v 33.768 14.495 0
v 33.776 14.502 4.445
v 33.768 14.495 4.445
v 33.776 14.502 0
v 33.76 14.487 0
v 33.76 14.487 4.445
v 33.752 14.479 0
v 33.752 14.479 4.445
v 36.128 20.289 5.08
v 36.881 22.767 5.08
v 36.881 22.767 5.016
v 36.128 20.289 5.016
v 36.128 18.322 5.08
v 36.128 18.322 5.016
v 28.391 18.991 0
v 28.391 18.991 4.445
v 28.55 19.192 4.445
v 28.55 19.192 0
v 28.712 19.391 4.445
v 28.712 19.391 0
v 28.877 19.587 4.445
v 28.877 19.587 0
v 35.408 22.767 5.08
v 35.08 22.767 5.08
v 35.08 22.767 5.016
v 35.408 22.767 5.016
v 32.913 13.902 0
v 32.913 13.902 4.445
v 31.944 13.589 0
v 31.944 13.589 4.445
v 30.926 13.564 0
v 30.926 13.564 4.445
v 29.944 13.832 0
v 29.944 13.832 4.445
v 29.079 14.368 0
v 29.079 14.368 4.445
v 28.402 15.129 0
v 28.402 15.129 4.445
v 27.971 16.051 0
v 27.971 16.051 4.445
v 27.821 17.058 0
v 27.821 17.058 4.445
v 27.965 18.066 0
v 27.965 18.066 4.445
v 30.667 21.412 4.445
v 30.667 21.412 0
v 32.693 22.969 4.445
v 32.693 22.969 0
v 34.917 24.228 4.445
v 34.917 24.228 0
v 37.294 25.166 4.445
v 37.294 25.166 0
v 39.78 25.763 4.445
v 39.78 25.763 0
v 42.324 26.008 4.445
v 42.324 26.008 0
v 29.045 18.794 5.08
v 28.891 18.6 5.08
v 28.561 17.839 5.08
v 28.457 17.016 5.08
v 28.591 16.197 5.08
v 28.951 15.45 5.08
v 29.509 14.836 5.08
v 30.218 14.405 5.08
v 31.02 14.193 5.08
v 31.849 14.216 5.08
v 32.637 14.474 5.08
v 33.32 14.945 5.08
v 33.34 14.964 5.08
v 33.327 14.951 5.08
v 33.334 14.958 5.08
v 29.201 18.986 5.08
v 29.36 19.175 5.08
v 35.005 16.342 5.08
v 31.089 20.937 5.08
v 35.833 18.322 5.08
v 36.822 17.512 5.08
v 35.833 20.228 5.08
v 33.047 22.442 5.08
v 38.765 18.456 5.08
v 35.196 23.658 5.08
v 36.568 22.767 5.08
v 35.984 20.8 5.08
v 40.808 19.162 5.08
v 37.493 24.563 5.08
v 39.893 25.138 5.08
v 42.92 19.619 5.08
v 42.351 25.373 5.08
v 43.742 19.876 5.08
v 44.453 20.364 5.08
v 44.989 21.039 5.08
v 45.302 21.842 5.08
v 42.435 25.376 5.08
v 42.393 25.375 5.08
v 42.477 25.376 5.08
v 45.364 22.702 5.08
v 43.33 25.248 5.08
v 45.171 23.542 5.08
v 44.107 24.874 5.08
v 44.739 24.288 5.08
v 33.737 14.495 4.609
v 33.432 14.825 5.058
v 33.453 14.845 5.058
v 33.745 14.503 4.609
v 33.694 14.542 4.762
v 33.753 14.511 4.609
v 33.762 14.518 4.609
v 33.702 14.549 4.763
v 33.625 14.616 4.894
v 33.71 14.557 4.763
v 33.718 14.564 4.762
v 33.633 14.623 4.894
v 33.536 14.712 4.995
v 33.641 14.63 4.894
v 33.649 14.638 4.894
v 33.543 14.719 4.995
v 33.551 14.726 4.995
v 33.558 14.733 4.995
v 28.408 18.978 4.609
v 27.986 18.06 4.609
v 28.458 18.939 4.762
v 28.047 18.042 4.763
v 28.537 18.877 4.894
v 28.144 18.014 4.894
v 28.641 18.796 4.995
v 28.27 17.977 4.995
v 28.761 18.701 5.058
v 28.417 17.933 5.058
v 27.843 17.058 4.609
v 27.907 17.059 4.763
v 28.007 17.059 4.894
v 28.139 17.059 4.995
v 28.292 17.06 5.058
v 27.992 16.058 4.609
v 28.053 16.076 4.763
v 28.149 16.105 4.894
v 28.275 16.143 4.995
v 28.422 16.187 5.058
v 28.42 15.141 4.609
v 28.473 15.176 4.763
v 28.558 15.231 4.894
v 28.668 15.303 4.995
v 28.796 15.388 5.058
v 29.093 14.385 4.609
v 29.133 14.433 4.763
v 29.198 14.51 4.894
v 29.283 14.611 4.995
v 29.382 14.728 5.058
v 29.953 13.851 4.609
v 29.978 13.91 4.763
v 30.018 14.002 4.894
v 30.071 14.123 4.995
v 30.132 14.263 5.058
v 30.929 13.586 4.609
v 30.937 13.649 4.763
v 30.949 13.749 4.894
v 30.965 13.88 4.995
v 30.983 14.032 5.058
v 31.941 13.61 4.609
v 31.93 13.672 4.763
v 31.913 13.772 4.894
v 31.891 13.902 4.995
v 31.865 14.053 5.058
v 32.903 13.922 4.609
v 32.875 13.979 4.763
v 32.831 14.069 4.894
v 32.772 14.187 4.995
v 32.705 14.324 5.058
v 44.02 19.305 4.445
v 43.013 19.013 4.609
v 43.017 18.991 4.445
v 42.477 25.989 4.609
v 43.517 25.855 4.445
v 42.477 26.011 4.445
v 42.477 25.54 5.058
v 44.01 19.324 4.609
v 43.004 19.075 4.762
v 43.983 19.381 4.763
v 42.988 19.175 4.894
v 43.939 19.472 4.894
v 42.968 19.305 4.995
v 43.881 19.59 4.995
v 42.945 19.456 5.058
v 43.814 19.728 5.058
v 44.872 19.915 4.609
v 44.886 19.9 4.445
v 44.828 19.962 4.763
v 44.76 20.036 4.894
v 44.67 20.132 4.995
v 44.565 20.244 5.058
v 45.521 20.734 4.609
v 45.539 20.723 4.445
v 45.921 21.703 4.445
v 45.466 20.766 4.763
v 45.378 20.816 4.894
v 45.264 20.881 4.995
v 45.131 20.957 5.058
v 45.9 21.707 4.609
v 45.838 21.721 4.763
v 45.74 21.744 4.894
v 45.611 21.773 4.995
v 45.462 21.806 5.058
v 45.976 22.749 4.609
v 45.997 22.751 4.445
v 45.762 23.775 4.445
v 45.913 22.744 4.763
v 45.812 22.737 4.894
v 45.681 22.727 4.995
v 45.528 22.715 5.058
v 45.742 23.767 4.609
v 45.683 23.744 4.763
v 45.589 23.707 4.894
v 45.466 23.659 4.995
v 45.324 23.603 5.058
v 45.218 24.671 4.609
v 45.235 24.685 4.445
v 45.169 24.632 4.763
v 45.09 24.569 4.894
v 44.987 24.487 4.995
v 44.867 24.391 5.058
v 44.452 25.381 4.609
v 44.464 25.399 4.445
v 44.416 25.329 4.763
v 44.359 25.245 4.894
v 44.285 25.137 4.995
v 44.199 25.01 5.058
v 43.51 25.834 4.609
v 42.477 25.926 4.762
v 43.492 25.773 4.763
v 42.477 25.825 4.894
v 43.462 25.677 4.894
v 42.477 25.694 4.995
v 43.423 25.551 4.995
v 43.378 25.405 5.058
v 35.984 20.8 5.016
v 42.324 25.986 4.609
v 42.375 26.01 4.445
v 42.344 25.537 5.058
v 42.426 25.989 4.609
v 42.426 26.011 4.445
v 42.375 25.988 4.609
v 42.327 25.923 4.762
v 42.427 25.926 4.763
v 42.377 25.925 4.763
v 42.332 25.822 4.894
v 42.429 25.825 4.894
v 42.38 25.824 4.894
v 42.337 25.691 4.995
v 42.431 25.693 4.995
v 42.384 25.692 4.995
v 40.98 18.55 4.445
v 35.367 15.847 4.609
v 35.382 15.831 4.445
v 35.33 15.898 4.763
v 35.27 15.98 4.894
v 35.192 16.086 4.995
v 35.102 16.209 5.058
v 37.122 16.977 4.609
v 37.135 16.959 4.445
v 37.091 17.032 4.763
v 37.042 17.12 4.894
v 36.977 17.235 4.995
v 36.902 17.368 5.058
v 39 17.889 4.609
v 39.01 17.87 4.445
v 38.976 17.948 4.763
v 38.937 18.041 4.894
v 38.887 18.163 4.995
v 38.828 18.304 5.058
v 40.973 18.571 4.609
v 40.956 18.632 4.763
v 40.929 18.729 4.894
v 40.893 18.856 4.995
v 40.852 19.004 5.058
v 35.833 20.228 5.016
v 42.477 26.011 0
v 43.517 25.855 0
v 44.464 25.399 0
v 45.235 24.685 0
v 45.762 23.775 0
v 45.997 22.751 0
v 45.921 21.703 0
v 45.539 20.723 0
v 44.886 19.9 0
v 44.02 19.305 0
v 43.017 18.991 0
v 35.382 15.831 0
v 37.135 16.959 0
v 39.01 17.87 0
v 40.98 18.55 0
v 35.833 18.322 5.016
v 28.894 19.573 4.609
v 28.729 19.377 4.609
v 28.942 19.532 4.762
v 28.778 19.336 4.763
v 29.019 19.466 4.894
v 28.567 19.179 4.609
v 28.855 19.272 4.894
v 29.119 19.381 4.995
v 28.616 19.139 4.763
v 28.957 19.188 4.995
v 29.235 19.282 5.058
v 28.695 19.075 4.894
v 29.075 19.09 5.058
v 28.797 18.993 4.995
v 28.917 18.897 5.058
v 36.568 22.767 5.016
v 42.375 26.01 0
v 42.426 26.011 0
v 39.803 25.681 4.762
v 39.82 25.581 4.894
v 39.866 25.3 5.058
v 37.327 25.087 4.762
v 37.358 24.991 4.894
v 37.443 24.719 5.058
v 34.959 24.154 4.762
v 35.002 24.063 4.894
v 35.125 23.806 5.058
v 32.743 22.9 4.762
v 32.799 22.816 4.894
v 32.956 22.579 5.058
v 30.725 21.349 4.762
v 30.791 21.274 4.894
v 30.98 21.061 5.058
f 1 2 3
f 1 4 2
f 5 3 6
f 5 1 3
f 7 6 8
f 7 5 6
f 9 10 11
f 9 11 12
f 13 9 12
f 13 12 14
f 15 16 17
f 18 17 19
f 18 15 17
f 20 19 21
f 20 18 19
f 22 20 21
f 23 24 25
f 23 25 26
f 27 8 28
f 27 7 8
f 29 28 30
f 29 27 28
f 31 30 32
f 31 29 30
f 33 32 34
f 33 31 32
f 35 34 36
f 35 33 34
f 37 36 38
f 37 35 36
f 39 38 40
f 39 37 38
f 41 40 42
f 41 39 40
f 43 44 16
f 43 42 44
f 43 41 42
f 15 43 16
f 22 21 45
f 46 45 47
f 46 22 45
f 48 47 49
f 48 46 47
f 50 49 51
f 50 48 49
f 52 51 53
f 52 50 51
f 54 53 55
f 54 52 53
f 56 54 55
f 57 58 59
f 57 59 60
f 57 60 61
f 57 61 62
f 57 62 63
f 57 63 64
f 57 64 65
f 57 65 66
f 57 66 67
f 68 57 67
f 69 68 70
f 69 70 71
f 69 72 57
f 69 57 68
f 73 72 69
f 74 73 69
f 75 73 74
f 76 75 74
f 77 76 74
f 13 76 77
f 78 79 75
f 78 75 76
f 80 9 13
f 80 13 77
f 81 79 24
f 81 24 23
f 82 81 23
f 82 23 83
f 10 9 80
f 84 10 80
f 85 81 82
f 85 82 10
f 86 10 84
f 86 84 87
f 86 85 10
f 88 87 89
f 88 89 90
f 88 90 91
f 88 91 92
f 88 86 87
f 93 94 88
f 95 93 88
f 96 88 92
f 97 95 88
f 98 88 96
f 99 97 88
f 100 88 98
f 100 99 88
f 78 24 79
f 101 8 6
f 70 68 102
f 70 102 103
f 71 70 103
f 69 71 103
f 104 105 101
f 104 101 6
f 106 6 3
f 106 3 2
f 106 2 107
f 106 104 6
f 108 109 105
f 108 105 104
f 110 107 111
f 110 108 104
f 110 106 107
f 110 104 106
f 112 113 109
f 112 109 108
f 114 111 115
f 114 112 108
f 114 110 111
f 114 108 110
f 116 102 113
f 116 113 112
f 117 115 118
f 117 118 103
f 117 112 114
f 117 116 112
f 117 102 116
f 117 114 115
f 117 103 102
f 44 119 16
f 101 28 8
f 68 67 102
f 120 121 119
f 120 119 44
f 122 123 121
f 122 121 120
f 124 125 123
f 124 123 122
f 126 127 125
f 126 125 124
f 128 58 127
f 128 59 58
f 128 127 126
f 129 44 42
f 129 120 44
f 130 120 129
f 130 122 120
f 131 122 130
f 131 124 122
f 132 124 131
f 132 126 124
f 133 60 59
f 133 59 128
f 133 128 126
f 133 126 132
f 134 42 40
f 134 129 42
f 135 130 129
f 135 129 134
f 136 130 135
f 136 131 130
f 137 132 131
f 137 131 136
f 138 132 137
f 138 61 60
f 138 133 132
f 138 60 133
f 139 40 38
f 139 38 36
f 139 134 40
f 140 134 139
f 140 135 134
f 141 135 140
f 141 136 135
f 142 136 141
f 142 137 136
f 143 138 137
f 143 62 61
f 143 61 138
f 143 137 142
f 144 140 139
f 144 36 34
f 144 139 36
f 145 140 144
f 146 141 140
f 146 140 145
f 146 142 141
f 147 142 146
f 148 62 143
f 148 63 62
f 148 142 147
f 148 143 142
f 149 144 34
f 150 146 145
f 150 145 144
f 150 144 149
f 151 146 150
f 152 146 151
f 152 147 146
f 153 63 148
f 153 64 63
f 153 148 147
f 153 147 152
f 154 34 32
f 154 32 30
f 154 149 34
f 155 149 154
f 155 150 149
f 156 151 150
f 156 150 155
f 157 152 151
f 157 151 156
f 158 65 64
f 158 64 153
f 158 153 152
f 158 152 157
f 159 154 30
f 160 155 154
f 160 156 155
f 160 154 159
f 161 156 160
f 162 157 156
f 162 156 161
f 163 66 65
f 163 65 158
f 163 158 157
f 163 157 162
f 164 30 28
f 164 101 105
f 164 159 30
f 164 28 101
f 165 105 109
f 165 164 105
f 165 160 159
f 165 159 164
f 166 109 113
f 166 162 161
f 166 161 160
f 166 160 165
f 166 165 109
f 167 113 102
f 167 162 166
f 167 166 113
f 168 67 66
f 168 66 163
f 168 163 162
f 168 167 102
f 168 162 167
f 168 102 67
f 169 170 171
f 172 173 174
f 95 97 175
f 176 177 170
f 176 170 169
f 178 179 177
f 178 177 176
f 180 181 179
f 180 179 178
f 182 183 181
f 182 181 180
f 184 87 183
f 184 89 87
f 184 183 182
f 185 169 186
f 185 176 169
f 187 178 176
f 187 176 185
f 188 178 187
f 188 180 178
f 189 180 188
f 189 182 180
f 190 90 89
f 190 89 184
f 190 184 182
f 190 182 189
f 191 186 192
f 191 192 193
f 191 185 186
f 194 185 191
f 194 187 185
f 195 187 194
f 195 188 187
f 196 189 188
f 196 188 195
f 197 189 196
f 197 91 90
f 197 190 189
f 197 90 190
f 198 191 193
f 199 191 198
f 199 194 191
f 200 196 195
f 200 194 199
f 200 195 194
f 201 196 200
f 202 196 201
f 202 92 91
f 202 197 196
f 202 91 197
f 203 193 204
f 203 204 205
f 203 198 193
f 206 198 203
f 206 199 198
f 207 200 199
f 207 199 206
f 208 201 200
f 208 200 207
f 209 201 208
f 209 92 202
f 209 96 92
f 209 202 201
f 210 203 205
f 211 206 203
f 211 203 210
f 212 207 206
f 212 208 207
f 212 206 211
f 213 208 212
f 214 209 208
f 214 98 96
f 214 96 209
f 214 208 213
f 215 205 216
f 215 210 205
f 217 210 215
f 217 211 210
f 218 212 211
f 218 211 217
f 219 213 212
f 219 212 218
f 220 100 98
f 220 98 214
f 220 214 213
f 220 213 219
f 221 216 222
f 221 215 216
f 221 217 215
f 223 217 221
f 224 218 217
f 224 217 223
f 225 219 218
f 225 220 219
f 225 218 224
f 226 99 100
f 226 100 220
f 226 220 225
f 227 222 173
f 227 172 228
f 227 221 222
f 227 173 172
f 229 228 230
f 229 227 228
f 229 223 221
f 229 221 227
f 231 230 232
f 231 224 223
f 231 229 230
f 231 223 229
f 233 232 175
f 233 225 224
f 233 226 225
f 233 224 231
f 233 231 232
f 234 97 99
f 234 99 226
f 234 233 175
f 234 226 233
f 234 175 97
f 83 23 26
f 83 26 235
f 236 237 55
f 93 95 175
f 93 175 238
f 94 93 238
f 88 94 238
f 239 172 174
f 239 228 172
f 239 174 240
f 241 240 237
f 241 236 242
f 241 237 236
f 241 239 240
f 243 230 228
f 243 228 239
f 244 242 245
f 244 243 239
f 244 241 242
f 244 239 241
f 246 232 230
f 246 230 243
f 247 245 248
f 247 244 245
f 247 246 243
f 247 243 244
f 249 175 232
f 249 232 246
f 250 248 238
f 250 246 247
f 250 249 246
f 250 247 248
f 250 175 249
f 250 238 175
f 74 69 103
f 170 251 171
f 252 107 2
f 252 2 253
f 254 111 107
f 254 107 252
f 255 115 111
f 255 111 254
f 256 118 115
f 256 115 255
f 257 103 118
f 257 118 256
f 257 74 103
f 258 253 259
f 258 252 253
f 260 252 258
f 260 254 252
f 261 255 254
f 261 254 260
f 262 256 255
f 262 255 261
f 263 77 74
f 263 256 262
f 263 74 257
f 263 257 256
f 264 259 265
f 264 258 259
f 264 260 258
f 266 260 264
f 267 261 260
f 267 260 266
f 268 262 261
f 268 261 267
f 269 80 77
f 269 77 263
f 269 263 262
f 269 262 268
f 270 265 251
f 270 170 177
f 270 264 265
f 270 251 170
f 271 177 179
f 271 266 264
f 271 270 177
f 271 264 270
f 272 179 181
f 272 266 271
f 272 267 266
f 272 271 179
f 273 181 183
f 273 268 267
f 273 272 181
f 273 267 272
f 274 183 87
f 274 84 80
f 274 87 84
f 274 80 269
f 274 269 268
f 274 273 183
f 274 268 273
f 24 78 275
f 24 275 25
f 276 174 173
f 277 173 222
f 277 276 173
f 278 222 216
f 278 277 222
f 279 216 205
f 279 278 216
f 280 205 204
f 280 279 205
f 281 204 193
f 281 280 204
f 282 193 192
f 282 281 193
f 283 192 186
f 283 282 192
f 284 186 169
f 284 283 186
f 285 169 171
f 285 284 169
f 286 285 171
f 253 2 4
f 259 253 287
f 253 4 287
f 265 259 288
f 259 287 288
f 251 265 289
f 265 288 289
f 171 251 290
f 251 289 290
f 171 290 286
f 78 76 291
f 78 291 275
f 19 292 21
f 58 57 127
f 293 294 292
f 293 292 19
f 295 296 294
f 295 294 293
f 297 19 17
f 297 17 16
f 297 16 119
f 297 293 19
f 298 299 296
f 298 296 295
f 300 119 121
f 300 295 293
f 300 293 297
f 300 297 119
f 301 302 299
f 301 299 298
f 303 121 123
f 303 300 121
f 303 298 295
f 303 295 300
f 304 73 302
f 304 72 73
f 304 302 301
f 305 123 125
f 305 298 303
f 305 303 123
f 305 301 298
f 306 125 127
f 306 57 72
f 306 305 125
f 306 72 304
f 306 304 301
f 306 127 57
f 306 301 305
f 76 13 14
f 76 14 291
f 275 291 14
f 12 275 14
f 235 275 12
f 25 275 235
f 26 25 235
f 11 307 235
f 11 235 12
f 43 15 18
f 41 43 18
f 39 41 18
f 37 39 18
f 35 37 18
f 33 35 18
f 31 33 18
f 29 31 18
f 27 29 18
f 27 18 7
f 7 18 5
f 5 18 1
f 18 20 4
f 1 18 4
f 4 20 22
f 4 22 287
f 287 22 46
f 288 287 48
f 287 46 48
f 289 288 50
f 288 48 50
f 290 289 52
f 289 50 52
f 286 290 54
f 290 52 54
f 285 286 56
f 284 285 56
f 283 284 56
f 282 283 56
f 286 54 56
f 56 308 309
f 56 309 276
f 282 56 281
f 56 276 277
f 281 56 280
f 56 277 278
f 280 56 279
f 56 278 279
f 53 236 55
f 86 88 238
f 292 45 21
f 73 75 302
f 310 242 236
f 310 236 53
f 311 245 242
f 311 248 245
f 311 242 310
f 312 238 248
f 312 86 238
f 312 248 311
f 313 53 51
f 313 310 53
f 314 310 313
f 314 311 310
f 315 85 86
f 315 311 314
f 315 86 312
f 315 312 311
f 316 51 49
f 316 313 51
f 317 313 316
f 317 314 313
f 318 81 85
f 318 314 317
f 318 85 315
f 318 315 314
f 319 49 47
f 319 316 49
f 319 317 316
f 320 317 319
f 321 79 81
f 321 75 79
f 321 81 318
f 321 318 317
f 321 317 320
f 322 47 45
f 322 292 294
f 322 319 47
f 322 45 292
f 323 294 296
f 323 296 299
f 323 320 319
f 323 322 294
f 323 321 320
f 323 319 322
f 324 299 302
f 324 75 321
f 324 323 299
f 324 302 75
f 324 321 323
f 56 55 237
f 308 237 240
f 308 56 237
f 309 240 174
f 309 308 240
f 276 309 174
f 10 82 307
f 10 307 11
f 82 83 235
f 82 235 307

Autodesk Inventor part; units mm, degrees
ref_plane "YZ Plane" through (0, 0, 0) normal (1, 0, 0) x (0, 1, 0)
ref_plane "XZ Plane" through (0, 0, 0) normal (0, 1, 0) x (-1, 0, 0)
ref_plane "XY Plane" through (0, 0, 0) normal (0, 0, 1) x (1, 0, 0)
sketch "Sketch2" plane through (0, 0, 0) normal (0, 0, 1) x (1, 0, 0)
  arc A0 (28.877, 19.587) -> (33.7764, 14.5025) centre (31.3521, 17.0692) ccw
  arc A1 (43.0166, 18.9913) -> (42.3235, 26.0077) centre (42.4773, 22.4804) ccw
  arc A2 (43.0166, 18.9913) -> (33.7516, 14.4793) centre (45.6813, 1.751) ccw
  arc A3 (42.4773, 26.011) -> (28.3906, 18.9913) centre (42.7991, 7.7213) ccw
  point P0 (0, 0)
  point P1 (43.3585, 19.0616)
extrude "Extrusion2" add sketch "Sketch2" along normal blind 5.08 contours A3 A1 A2 A0
fillet "Fillet5" radius 0.635 6 edges at (42.4004, 26.0095, 5.08) (28.6307, 19.2917, 5.08) (38.0586, 17.4425, 5.08) (33.764, 14.4909, 5.08) (45.9976, 22.7509, 5.08) (29.0787, 14.368, 5.08)
sketch "Sketch3" plane through (0, 0, 5.08) normal (0, 0, 1) x (1, 0, 0)
  line L0 (35.098, 22.767) -> (40.3325, 22.767) construction
  line L1 (40.3325, 22.767) -> (40.3325, 19.1255) construction
  line L2 (40.3325, 19.1255) -> (35.098, 19.1255) construction
  line L3 (35.098, 19.1255) -> (35.098, 22.767) construction
  line L4 (36.881, 22.767) -> (36.1282, 20.2887)
  line L5 (36.1282, 20.2887) -> (36.1282, 18.322)
  line L6 (36.1282, 18.322) -> (35.8328, 18.322)
  line L7 (35.8328, 18.322) -> (35.8328, 20.2275)
  line L8 (35.8328, 20.2275) -> (35.0799, 22.767)
  line L9 (35.0799, 22.767) -> (35.4077, 22.767)
  line L10 (35.4077, 22.767) -> (35.9841, 20.8002)
  line L11 (35.9841, 20.8002) -> (36.5676, 22.767)
  line L12 (36.5676, 22.767) -> (36.881, 22.767)
  point P0 (0, 0)
extrude "Extrusion3" cut sketch "Sketch3" against normal blind 0.0635
properties part number "Y Button"
